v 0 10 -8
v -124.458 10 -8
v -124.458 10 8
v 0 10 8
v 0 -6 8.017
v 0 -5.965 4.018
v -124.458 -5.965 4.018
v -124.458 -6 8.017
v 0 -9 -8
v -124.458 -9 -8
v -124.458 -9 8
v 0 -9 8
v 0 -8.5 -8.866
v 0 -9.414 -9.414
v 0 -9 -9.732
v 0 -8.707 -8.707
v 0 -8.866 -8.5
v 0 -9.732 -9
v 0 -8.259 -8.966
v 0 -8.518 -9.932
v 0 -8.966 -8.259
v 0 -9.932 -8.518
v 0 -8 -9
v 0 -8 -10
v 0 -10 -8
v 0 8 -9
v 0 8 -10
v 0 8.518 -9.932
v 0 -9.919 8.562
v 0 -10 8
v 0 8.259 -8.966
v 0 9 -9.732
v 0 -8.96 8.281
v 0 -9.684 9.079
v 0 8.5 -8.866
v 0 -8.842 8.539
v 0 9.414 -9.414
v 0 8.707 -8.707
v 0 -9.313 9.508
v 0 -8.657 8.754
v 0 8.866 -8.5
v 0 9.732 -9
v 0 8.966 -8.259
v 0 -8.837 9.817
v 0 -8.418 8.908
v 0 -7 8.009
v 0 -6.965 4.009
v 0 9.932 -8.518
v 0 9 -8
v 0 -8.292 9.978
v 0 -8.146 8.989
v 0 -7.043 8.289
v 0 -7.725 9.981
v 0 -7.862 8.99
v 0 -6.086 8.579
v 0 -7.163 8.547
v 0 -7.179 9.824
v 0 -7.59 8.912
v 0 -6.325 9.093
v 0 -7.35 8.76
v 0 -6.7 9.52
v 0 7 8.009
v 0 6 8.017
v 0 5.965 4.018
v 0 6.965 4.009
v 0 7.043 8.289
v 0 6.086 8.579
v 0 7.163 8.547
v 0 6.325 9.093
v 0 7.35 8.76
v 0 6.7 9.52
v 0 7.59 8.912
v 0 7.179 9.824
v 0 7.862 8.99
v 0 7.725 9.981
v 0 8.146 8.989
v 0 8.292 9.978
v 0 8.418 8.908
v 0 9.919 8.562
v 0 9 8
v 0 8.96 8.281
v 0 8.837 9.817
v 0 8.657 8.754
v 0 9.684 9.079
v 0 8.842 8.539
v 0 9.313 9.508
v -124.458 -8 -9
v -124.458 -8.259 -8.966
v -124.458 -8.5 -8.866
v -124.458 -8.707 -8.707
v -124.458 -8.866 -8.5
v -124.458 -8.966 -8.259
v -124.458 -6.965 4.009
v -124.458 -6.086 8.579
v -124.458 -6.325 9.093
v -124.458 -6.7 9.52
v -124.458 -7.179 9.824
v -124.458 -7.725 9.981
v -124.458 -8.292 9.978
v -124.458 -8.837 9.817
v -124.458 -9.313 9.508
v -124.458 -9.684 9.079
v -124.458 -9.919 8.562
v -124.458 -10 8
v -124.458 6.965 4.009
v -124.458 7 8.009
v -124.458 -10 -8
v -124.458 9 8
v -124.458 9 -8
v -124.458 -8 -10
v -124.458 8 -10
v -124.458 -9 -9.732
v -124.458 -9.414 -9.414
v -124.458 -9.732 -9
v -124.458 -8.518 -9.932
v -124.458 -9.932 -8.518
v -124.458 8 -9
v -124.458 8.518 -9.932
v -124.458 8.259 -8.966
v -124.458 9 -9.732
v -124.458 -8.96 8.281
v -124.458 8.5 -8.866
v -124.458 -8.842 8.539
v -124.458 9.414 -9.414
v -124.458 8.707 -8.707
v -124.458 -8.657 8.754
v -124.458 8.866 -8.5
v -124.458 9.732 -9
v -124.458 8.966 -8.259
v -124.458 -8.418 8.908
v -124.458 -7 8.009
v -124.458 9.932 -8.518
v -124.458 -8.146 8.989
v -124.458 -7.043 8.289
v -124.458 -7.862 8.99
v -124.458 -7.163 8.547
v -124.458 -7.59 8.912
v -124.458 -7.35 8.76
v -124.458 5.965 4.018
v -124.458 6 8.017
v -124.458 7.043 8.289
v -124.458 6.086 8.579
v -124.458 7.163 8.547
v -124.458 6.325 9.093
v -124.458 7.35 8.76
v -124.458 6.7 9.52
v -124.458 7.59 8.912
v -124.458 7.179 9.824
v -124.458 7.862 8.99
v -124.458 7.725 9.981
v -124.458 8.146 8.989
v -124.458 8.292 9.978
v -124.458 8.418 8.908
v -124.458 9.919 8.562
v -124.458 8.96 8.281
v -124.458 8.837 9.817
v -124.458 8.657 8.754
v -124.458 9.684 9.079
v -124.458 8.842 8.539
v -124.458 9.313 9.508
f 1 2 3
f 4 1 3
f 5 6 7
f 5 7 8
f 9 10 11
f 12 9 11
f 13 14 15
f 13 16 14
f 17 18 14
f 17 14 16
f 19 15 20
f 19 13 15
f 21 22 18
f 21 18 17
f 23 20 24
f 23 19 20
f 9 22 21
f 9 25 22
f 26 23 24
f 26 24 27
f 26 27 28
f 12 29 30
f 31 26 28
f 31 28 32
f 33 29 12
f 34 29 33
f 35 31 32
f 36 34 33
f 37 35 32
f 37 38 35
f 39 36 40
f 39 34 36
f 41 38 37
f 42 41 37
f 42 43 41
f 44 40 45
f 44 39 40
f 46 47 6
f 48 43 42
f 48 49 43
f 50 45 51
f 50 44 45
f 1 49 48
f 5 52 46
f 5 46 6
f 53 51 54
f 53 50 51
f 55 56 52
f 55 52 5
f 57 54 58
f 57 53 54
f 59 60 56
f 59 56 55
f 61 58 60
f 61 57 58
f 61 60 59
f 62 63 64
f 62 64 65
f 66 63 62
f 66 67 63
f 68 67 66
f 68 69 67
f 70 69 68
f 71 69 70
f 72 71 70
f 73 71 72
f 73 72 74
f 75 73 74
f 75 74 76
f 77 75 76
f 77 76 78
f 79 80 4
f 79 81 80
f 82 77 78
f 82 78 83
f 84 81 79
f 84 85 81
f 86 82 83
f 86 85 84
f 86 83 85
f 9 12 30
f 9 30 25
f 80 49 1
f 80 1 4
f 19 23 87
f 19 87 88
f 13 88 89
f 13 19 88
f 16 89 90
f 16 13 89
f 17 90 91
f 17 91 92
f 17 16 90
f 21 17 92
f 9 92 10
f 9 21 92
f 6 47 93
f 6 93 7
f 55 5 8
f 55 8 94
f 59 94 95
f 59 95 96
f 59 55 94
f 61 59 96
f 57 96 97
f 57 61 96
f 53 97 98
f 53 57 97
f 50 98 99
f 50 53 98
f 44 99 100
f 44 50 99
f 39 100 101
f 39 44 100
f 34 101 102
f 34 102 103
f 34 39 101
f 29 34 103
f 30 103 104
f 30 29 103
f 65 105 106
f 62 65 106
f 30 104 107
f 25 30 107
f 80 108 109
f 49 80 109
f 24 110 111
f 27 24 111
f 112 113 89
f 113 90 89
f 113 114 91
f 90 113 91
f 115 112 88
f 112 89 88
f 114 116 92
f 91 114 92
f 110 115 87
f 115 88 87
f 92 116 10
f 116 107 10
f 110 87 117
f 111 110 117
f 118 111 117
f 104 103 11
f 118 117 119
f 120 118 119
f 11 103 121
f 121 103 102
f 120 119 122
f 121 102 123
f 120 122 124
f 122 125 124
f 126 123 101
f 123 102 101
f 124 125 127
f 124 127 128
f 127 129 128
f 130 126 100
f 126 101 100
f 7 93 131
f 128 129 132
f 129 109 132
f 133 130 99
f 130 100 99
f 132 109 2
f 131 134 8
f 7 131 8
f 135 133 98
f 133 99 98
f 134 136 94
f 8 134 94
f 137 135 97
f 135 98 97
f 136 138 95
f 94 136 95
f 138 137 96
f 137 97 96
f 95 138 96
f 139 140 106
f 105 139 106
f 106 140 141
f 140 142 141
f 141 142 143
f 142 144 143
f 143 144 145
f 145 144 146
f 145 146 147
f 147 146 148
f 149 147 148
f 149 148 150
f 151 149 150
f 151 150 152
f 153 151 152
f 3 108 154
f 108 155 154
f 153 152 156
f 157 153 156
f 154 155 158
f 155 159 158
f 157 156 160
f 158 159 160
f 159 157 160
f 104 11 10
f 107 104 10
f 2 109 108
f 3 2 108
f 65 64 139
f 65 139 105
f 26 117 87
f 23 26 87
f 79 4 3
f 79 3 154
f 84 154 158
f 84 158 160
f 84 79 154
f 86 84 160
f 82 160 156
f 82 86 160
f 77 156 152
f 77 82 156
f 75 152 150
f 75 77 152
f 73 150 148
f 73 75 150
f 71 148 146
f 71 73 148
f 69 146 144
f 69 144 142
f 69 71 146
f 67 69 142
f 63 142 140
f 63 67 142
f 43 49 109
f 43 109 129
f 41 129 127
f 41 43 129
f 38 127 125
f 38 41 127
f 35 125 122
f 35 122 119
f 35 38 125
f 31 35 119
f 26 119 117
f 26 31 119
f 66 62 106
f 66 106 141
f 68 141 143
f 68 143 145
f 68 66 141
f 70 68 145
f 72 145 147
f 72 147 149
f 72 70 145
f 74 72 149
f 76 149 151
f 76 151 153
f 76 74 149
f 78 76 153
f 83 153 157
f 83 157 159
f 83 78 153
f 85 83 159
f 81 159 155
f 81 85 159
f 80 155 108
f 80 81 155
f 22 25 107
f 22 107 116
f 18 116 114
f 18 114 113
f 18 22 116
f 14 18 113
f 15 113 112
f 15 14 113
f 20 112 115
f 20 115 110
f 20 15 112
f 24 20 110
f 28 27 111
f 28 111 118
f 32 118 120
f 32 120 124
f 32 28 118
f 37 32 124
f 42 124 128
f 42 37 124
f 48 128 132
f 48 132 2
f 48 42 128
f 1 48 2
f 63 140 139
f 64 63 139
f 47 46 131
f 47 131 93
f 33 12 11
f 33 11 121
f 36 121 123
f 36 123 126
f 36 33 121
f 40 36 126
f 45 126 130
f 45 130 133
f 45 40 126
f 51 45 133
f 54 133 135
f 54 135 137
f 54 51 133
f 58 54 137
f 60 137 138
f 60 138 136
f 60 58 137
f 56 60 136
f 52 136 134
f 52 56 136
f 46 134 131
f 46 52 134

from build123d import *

# Parameters (mm, degrees)
ABC_DEPTH = 124.457734282


with BuildPart() as part:
    # Sketch15 → ABC (new body)
    with BuildSketch(Plane(origin=(0, 0, 0), x_dir=(0, -1, 0), z_dir=(-1, 0, 0))):
        with BuildLine():
            Line((-8, -9), (8, -9))
            ThreePointArc((8, -9), (8.707106781, -8.707106781), (9, -8))
            Line((9, -8), (9, 8))
            ThreePointArc((9, 8), (8.004363309, 8.999990481), (7.000038077, 8.008726535))
            Line((7.000038077, 8.008726535), (6.965131935, 4.008878843))
            Line((6.965131935, 4.008878843), (5.965170012, 4.017605379))
            Line((5.965170012, 4.017605379), (6.000076154, 8.017453071))
            ThreePointArc((6.000076154, 8.017453071), (8.008726619, 9.999980961), (10, 8))
            Line((10, 8), (10, -8))
            ThreePointArc((10, -8), (9.414213562, -9.414213562), (8, -10))
            Line((8, -10), (-8, -10))
            ThreePointArc((-8, -10), (-9.414213562, -9.414213562), (-10, -8))
            Line((-10, -8), (-10, 8))
            ThreePointArc((-10, 8), (-8.008726619, 9.999980961), (-6.000076154, 8.017453071))
            Line((-6.000076154, 8.017453071), (-5.965170012, 4.017605379))
            Line((-5.965170012, 4.017605379), (-6.965131935, 4.008878843))
            Line((-6.965131935, 4.008878843), (-7.000038077, 8.008726535))
            ThreePointArc((-7.000038077, 8.008726535), (-8.004363309, 8.999990481), (-9, 8))
            Line((-9, 8), (-9, -8))
            ThreePointArc((-9, -8), (-8.707106781, -8.707106781), (-8, -9))
        make_face()
    extrude(amount=ABC_DEPTH)


solid = part.part
